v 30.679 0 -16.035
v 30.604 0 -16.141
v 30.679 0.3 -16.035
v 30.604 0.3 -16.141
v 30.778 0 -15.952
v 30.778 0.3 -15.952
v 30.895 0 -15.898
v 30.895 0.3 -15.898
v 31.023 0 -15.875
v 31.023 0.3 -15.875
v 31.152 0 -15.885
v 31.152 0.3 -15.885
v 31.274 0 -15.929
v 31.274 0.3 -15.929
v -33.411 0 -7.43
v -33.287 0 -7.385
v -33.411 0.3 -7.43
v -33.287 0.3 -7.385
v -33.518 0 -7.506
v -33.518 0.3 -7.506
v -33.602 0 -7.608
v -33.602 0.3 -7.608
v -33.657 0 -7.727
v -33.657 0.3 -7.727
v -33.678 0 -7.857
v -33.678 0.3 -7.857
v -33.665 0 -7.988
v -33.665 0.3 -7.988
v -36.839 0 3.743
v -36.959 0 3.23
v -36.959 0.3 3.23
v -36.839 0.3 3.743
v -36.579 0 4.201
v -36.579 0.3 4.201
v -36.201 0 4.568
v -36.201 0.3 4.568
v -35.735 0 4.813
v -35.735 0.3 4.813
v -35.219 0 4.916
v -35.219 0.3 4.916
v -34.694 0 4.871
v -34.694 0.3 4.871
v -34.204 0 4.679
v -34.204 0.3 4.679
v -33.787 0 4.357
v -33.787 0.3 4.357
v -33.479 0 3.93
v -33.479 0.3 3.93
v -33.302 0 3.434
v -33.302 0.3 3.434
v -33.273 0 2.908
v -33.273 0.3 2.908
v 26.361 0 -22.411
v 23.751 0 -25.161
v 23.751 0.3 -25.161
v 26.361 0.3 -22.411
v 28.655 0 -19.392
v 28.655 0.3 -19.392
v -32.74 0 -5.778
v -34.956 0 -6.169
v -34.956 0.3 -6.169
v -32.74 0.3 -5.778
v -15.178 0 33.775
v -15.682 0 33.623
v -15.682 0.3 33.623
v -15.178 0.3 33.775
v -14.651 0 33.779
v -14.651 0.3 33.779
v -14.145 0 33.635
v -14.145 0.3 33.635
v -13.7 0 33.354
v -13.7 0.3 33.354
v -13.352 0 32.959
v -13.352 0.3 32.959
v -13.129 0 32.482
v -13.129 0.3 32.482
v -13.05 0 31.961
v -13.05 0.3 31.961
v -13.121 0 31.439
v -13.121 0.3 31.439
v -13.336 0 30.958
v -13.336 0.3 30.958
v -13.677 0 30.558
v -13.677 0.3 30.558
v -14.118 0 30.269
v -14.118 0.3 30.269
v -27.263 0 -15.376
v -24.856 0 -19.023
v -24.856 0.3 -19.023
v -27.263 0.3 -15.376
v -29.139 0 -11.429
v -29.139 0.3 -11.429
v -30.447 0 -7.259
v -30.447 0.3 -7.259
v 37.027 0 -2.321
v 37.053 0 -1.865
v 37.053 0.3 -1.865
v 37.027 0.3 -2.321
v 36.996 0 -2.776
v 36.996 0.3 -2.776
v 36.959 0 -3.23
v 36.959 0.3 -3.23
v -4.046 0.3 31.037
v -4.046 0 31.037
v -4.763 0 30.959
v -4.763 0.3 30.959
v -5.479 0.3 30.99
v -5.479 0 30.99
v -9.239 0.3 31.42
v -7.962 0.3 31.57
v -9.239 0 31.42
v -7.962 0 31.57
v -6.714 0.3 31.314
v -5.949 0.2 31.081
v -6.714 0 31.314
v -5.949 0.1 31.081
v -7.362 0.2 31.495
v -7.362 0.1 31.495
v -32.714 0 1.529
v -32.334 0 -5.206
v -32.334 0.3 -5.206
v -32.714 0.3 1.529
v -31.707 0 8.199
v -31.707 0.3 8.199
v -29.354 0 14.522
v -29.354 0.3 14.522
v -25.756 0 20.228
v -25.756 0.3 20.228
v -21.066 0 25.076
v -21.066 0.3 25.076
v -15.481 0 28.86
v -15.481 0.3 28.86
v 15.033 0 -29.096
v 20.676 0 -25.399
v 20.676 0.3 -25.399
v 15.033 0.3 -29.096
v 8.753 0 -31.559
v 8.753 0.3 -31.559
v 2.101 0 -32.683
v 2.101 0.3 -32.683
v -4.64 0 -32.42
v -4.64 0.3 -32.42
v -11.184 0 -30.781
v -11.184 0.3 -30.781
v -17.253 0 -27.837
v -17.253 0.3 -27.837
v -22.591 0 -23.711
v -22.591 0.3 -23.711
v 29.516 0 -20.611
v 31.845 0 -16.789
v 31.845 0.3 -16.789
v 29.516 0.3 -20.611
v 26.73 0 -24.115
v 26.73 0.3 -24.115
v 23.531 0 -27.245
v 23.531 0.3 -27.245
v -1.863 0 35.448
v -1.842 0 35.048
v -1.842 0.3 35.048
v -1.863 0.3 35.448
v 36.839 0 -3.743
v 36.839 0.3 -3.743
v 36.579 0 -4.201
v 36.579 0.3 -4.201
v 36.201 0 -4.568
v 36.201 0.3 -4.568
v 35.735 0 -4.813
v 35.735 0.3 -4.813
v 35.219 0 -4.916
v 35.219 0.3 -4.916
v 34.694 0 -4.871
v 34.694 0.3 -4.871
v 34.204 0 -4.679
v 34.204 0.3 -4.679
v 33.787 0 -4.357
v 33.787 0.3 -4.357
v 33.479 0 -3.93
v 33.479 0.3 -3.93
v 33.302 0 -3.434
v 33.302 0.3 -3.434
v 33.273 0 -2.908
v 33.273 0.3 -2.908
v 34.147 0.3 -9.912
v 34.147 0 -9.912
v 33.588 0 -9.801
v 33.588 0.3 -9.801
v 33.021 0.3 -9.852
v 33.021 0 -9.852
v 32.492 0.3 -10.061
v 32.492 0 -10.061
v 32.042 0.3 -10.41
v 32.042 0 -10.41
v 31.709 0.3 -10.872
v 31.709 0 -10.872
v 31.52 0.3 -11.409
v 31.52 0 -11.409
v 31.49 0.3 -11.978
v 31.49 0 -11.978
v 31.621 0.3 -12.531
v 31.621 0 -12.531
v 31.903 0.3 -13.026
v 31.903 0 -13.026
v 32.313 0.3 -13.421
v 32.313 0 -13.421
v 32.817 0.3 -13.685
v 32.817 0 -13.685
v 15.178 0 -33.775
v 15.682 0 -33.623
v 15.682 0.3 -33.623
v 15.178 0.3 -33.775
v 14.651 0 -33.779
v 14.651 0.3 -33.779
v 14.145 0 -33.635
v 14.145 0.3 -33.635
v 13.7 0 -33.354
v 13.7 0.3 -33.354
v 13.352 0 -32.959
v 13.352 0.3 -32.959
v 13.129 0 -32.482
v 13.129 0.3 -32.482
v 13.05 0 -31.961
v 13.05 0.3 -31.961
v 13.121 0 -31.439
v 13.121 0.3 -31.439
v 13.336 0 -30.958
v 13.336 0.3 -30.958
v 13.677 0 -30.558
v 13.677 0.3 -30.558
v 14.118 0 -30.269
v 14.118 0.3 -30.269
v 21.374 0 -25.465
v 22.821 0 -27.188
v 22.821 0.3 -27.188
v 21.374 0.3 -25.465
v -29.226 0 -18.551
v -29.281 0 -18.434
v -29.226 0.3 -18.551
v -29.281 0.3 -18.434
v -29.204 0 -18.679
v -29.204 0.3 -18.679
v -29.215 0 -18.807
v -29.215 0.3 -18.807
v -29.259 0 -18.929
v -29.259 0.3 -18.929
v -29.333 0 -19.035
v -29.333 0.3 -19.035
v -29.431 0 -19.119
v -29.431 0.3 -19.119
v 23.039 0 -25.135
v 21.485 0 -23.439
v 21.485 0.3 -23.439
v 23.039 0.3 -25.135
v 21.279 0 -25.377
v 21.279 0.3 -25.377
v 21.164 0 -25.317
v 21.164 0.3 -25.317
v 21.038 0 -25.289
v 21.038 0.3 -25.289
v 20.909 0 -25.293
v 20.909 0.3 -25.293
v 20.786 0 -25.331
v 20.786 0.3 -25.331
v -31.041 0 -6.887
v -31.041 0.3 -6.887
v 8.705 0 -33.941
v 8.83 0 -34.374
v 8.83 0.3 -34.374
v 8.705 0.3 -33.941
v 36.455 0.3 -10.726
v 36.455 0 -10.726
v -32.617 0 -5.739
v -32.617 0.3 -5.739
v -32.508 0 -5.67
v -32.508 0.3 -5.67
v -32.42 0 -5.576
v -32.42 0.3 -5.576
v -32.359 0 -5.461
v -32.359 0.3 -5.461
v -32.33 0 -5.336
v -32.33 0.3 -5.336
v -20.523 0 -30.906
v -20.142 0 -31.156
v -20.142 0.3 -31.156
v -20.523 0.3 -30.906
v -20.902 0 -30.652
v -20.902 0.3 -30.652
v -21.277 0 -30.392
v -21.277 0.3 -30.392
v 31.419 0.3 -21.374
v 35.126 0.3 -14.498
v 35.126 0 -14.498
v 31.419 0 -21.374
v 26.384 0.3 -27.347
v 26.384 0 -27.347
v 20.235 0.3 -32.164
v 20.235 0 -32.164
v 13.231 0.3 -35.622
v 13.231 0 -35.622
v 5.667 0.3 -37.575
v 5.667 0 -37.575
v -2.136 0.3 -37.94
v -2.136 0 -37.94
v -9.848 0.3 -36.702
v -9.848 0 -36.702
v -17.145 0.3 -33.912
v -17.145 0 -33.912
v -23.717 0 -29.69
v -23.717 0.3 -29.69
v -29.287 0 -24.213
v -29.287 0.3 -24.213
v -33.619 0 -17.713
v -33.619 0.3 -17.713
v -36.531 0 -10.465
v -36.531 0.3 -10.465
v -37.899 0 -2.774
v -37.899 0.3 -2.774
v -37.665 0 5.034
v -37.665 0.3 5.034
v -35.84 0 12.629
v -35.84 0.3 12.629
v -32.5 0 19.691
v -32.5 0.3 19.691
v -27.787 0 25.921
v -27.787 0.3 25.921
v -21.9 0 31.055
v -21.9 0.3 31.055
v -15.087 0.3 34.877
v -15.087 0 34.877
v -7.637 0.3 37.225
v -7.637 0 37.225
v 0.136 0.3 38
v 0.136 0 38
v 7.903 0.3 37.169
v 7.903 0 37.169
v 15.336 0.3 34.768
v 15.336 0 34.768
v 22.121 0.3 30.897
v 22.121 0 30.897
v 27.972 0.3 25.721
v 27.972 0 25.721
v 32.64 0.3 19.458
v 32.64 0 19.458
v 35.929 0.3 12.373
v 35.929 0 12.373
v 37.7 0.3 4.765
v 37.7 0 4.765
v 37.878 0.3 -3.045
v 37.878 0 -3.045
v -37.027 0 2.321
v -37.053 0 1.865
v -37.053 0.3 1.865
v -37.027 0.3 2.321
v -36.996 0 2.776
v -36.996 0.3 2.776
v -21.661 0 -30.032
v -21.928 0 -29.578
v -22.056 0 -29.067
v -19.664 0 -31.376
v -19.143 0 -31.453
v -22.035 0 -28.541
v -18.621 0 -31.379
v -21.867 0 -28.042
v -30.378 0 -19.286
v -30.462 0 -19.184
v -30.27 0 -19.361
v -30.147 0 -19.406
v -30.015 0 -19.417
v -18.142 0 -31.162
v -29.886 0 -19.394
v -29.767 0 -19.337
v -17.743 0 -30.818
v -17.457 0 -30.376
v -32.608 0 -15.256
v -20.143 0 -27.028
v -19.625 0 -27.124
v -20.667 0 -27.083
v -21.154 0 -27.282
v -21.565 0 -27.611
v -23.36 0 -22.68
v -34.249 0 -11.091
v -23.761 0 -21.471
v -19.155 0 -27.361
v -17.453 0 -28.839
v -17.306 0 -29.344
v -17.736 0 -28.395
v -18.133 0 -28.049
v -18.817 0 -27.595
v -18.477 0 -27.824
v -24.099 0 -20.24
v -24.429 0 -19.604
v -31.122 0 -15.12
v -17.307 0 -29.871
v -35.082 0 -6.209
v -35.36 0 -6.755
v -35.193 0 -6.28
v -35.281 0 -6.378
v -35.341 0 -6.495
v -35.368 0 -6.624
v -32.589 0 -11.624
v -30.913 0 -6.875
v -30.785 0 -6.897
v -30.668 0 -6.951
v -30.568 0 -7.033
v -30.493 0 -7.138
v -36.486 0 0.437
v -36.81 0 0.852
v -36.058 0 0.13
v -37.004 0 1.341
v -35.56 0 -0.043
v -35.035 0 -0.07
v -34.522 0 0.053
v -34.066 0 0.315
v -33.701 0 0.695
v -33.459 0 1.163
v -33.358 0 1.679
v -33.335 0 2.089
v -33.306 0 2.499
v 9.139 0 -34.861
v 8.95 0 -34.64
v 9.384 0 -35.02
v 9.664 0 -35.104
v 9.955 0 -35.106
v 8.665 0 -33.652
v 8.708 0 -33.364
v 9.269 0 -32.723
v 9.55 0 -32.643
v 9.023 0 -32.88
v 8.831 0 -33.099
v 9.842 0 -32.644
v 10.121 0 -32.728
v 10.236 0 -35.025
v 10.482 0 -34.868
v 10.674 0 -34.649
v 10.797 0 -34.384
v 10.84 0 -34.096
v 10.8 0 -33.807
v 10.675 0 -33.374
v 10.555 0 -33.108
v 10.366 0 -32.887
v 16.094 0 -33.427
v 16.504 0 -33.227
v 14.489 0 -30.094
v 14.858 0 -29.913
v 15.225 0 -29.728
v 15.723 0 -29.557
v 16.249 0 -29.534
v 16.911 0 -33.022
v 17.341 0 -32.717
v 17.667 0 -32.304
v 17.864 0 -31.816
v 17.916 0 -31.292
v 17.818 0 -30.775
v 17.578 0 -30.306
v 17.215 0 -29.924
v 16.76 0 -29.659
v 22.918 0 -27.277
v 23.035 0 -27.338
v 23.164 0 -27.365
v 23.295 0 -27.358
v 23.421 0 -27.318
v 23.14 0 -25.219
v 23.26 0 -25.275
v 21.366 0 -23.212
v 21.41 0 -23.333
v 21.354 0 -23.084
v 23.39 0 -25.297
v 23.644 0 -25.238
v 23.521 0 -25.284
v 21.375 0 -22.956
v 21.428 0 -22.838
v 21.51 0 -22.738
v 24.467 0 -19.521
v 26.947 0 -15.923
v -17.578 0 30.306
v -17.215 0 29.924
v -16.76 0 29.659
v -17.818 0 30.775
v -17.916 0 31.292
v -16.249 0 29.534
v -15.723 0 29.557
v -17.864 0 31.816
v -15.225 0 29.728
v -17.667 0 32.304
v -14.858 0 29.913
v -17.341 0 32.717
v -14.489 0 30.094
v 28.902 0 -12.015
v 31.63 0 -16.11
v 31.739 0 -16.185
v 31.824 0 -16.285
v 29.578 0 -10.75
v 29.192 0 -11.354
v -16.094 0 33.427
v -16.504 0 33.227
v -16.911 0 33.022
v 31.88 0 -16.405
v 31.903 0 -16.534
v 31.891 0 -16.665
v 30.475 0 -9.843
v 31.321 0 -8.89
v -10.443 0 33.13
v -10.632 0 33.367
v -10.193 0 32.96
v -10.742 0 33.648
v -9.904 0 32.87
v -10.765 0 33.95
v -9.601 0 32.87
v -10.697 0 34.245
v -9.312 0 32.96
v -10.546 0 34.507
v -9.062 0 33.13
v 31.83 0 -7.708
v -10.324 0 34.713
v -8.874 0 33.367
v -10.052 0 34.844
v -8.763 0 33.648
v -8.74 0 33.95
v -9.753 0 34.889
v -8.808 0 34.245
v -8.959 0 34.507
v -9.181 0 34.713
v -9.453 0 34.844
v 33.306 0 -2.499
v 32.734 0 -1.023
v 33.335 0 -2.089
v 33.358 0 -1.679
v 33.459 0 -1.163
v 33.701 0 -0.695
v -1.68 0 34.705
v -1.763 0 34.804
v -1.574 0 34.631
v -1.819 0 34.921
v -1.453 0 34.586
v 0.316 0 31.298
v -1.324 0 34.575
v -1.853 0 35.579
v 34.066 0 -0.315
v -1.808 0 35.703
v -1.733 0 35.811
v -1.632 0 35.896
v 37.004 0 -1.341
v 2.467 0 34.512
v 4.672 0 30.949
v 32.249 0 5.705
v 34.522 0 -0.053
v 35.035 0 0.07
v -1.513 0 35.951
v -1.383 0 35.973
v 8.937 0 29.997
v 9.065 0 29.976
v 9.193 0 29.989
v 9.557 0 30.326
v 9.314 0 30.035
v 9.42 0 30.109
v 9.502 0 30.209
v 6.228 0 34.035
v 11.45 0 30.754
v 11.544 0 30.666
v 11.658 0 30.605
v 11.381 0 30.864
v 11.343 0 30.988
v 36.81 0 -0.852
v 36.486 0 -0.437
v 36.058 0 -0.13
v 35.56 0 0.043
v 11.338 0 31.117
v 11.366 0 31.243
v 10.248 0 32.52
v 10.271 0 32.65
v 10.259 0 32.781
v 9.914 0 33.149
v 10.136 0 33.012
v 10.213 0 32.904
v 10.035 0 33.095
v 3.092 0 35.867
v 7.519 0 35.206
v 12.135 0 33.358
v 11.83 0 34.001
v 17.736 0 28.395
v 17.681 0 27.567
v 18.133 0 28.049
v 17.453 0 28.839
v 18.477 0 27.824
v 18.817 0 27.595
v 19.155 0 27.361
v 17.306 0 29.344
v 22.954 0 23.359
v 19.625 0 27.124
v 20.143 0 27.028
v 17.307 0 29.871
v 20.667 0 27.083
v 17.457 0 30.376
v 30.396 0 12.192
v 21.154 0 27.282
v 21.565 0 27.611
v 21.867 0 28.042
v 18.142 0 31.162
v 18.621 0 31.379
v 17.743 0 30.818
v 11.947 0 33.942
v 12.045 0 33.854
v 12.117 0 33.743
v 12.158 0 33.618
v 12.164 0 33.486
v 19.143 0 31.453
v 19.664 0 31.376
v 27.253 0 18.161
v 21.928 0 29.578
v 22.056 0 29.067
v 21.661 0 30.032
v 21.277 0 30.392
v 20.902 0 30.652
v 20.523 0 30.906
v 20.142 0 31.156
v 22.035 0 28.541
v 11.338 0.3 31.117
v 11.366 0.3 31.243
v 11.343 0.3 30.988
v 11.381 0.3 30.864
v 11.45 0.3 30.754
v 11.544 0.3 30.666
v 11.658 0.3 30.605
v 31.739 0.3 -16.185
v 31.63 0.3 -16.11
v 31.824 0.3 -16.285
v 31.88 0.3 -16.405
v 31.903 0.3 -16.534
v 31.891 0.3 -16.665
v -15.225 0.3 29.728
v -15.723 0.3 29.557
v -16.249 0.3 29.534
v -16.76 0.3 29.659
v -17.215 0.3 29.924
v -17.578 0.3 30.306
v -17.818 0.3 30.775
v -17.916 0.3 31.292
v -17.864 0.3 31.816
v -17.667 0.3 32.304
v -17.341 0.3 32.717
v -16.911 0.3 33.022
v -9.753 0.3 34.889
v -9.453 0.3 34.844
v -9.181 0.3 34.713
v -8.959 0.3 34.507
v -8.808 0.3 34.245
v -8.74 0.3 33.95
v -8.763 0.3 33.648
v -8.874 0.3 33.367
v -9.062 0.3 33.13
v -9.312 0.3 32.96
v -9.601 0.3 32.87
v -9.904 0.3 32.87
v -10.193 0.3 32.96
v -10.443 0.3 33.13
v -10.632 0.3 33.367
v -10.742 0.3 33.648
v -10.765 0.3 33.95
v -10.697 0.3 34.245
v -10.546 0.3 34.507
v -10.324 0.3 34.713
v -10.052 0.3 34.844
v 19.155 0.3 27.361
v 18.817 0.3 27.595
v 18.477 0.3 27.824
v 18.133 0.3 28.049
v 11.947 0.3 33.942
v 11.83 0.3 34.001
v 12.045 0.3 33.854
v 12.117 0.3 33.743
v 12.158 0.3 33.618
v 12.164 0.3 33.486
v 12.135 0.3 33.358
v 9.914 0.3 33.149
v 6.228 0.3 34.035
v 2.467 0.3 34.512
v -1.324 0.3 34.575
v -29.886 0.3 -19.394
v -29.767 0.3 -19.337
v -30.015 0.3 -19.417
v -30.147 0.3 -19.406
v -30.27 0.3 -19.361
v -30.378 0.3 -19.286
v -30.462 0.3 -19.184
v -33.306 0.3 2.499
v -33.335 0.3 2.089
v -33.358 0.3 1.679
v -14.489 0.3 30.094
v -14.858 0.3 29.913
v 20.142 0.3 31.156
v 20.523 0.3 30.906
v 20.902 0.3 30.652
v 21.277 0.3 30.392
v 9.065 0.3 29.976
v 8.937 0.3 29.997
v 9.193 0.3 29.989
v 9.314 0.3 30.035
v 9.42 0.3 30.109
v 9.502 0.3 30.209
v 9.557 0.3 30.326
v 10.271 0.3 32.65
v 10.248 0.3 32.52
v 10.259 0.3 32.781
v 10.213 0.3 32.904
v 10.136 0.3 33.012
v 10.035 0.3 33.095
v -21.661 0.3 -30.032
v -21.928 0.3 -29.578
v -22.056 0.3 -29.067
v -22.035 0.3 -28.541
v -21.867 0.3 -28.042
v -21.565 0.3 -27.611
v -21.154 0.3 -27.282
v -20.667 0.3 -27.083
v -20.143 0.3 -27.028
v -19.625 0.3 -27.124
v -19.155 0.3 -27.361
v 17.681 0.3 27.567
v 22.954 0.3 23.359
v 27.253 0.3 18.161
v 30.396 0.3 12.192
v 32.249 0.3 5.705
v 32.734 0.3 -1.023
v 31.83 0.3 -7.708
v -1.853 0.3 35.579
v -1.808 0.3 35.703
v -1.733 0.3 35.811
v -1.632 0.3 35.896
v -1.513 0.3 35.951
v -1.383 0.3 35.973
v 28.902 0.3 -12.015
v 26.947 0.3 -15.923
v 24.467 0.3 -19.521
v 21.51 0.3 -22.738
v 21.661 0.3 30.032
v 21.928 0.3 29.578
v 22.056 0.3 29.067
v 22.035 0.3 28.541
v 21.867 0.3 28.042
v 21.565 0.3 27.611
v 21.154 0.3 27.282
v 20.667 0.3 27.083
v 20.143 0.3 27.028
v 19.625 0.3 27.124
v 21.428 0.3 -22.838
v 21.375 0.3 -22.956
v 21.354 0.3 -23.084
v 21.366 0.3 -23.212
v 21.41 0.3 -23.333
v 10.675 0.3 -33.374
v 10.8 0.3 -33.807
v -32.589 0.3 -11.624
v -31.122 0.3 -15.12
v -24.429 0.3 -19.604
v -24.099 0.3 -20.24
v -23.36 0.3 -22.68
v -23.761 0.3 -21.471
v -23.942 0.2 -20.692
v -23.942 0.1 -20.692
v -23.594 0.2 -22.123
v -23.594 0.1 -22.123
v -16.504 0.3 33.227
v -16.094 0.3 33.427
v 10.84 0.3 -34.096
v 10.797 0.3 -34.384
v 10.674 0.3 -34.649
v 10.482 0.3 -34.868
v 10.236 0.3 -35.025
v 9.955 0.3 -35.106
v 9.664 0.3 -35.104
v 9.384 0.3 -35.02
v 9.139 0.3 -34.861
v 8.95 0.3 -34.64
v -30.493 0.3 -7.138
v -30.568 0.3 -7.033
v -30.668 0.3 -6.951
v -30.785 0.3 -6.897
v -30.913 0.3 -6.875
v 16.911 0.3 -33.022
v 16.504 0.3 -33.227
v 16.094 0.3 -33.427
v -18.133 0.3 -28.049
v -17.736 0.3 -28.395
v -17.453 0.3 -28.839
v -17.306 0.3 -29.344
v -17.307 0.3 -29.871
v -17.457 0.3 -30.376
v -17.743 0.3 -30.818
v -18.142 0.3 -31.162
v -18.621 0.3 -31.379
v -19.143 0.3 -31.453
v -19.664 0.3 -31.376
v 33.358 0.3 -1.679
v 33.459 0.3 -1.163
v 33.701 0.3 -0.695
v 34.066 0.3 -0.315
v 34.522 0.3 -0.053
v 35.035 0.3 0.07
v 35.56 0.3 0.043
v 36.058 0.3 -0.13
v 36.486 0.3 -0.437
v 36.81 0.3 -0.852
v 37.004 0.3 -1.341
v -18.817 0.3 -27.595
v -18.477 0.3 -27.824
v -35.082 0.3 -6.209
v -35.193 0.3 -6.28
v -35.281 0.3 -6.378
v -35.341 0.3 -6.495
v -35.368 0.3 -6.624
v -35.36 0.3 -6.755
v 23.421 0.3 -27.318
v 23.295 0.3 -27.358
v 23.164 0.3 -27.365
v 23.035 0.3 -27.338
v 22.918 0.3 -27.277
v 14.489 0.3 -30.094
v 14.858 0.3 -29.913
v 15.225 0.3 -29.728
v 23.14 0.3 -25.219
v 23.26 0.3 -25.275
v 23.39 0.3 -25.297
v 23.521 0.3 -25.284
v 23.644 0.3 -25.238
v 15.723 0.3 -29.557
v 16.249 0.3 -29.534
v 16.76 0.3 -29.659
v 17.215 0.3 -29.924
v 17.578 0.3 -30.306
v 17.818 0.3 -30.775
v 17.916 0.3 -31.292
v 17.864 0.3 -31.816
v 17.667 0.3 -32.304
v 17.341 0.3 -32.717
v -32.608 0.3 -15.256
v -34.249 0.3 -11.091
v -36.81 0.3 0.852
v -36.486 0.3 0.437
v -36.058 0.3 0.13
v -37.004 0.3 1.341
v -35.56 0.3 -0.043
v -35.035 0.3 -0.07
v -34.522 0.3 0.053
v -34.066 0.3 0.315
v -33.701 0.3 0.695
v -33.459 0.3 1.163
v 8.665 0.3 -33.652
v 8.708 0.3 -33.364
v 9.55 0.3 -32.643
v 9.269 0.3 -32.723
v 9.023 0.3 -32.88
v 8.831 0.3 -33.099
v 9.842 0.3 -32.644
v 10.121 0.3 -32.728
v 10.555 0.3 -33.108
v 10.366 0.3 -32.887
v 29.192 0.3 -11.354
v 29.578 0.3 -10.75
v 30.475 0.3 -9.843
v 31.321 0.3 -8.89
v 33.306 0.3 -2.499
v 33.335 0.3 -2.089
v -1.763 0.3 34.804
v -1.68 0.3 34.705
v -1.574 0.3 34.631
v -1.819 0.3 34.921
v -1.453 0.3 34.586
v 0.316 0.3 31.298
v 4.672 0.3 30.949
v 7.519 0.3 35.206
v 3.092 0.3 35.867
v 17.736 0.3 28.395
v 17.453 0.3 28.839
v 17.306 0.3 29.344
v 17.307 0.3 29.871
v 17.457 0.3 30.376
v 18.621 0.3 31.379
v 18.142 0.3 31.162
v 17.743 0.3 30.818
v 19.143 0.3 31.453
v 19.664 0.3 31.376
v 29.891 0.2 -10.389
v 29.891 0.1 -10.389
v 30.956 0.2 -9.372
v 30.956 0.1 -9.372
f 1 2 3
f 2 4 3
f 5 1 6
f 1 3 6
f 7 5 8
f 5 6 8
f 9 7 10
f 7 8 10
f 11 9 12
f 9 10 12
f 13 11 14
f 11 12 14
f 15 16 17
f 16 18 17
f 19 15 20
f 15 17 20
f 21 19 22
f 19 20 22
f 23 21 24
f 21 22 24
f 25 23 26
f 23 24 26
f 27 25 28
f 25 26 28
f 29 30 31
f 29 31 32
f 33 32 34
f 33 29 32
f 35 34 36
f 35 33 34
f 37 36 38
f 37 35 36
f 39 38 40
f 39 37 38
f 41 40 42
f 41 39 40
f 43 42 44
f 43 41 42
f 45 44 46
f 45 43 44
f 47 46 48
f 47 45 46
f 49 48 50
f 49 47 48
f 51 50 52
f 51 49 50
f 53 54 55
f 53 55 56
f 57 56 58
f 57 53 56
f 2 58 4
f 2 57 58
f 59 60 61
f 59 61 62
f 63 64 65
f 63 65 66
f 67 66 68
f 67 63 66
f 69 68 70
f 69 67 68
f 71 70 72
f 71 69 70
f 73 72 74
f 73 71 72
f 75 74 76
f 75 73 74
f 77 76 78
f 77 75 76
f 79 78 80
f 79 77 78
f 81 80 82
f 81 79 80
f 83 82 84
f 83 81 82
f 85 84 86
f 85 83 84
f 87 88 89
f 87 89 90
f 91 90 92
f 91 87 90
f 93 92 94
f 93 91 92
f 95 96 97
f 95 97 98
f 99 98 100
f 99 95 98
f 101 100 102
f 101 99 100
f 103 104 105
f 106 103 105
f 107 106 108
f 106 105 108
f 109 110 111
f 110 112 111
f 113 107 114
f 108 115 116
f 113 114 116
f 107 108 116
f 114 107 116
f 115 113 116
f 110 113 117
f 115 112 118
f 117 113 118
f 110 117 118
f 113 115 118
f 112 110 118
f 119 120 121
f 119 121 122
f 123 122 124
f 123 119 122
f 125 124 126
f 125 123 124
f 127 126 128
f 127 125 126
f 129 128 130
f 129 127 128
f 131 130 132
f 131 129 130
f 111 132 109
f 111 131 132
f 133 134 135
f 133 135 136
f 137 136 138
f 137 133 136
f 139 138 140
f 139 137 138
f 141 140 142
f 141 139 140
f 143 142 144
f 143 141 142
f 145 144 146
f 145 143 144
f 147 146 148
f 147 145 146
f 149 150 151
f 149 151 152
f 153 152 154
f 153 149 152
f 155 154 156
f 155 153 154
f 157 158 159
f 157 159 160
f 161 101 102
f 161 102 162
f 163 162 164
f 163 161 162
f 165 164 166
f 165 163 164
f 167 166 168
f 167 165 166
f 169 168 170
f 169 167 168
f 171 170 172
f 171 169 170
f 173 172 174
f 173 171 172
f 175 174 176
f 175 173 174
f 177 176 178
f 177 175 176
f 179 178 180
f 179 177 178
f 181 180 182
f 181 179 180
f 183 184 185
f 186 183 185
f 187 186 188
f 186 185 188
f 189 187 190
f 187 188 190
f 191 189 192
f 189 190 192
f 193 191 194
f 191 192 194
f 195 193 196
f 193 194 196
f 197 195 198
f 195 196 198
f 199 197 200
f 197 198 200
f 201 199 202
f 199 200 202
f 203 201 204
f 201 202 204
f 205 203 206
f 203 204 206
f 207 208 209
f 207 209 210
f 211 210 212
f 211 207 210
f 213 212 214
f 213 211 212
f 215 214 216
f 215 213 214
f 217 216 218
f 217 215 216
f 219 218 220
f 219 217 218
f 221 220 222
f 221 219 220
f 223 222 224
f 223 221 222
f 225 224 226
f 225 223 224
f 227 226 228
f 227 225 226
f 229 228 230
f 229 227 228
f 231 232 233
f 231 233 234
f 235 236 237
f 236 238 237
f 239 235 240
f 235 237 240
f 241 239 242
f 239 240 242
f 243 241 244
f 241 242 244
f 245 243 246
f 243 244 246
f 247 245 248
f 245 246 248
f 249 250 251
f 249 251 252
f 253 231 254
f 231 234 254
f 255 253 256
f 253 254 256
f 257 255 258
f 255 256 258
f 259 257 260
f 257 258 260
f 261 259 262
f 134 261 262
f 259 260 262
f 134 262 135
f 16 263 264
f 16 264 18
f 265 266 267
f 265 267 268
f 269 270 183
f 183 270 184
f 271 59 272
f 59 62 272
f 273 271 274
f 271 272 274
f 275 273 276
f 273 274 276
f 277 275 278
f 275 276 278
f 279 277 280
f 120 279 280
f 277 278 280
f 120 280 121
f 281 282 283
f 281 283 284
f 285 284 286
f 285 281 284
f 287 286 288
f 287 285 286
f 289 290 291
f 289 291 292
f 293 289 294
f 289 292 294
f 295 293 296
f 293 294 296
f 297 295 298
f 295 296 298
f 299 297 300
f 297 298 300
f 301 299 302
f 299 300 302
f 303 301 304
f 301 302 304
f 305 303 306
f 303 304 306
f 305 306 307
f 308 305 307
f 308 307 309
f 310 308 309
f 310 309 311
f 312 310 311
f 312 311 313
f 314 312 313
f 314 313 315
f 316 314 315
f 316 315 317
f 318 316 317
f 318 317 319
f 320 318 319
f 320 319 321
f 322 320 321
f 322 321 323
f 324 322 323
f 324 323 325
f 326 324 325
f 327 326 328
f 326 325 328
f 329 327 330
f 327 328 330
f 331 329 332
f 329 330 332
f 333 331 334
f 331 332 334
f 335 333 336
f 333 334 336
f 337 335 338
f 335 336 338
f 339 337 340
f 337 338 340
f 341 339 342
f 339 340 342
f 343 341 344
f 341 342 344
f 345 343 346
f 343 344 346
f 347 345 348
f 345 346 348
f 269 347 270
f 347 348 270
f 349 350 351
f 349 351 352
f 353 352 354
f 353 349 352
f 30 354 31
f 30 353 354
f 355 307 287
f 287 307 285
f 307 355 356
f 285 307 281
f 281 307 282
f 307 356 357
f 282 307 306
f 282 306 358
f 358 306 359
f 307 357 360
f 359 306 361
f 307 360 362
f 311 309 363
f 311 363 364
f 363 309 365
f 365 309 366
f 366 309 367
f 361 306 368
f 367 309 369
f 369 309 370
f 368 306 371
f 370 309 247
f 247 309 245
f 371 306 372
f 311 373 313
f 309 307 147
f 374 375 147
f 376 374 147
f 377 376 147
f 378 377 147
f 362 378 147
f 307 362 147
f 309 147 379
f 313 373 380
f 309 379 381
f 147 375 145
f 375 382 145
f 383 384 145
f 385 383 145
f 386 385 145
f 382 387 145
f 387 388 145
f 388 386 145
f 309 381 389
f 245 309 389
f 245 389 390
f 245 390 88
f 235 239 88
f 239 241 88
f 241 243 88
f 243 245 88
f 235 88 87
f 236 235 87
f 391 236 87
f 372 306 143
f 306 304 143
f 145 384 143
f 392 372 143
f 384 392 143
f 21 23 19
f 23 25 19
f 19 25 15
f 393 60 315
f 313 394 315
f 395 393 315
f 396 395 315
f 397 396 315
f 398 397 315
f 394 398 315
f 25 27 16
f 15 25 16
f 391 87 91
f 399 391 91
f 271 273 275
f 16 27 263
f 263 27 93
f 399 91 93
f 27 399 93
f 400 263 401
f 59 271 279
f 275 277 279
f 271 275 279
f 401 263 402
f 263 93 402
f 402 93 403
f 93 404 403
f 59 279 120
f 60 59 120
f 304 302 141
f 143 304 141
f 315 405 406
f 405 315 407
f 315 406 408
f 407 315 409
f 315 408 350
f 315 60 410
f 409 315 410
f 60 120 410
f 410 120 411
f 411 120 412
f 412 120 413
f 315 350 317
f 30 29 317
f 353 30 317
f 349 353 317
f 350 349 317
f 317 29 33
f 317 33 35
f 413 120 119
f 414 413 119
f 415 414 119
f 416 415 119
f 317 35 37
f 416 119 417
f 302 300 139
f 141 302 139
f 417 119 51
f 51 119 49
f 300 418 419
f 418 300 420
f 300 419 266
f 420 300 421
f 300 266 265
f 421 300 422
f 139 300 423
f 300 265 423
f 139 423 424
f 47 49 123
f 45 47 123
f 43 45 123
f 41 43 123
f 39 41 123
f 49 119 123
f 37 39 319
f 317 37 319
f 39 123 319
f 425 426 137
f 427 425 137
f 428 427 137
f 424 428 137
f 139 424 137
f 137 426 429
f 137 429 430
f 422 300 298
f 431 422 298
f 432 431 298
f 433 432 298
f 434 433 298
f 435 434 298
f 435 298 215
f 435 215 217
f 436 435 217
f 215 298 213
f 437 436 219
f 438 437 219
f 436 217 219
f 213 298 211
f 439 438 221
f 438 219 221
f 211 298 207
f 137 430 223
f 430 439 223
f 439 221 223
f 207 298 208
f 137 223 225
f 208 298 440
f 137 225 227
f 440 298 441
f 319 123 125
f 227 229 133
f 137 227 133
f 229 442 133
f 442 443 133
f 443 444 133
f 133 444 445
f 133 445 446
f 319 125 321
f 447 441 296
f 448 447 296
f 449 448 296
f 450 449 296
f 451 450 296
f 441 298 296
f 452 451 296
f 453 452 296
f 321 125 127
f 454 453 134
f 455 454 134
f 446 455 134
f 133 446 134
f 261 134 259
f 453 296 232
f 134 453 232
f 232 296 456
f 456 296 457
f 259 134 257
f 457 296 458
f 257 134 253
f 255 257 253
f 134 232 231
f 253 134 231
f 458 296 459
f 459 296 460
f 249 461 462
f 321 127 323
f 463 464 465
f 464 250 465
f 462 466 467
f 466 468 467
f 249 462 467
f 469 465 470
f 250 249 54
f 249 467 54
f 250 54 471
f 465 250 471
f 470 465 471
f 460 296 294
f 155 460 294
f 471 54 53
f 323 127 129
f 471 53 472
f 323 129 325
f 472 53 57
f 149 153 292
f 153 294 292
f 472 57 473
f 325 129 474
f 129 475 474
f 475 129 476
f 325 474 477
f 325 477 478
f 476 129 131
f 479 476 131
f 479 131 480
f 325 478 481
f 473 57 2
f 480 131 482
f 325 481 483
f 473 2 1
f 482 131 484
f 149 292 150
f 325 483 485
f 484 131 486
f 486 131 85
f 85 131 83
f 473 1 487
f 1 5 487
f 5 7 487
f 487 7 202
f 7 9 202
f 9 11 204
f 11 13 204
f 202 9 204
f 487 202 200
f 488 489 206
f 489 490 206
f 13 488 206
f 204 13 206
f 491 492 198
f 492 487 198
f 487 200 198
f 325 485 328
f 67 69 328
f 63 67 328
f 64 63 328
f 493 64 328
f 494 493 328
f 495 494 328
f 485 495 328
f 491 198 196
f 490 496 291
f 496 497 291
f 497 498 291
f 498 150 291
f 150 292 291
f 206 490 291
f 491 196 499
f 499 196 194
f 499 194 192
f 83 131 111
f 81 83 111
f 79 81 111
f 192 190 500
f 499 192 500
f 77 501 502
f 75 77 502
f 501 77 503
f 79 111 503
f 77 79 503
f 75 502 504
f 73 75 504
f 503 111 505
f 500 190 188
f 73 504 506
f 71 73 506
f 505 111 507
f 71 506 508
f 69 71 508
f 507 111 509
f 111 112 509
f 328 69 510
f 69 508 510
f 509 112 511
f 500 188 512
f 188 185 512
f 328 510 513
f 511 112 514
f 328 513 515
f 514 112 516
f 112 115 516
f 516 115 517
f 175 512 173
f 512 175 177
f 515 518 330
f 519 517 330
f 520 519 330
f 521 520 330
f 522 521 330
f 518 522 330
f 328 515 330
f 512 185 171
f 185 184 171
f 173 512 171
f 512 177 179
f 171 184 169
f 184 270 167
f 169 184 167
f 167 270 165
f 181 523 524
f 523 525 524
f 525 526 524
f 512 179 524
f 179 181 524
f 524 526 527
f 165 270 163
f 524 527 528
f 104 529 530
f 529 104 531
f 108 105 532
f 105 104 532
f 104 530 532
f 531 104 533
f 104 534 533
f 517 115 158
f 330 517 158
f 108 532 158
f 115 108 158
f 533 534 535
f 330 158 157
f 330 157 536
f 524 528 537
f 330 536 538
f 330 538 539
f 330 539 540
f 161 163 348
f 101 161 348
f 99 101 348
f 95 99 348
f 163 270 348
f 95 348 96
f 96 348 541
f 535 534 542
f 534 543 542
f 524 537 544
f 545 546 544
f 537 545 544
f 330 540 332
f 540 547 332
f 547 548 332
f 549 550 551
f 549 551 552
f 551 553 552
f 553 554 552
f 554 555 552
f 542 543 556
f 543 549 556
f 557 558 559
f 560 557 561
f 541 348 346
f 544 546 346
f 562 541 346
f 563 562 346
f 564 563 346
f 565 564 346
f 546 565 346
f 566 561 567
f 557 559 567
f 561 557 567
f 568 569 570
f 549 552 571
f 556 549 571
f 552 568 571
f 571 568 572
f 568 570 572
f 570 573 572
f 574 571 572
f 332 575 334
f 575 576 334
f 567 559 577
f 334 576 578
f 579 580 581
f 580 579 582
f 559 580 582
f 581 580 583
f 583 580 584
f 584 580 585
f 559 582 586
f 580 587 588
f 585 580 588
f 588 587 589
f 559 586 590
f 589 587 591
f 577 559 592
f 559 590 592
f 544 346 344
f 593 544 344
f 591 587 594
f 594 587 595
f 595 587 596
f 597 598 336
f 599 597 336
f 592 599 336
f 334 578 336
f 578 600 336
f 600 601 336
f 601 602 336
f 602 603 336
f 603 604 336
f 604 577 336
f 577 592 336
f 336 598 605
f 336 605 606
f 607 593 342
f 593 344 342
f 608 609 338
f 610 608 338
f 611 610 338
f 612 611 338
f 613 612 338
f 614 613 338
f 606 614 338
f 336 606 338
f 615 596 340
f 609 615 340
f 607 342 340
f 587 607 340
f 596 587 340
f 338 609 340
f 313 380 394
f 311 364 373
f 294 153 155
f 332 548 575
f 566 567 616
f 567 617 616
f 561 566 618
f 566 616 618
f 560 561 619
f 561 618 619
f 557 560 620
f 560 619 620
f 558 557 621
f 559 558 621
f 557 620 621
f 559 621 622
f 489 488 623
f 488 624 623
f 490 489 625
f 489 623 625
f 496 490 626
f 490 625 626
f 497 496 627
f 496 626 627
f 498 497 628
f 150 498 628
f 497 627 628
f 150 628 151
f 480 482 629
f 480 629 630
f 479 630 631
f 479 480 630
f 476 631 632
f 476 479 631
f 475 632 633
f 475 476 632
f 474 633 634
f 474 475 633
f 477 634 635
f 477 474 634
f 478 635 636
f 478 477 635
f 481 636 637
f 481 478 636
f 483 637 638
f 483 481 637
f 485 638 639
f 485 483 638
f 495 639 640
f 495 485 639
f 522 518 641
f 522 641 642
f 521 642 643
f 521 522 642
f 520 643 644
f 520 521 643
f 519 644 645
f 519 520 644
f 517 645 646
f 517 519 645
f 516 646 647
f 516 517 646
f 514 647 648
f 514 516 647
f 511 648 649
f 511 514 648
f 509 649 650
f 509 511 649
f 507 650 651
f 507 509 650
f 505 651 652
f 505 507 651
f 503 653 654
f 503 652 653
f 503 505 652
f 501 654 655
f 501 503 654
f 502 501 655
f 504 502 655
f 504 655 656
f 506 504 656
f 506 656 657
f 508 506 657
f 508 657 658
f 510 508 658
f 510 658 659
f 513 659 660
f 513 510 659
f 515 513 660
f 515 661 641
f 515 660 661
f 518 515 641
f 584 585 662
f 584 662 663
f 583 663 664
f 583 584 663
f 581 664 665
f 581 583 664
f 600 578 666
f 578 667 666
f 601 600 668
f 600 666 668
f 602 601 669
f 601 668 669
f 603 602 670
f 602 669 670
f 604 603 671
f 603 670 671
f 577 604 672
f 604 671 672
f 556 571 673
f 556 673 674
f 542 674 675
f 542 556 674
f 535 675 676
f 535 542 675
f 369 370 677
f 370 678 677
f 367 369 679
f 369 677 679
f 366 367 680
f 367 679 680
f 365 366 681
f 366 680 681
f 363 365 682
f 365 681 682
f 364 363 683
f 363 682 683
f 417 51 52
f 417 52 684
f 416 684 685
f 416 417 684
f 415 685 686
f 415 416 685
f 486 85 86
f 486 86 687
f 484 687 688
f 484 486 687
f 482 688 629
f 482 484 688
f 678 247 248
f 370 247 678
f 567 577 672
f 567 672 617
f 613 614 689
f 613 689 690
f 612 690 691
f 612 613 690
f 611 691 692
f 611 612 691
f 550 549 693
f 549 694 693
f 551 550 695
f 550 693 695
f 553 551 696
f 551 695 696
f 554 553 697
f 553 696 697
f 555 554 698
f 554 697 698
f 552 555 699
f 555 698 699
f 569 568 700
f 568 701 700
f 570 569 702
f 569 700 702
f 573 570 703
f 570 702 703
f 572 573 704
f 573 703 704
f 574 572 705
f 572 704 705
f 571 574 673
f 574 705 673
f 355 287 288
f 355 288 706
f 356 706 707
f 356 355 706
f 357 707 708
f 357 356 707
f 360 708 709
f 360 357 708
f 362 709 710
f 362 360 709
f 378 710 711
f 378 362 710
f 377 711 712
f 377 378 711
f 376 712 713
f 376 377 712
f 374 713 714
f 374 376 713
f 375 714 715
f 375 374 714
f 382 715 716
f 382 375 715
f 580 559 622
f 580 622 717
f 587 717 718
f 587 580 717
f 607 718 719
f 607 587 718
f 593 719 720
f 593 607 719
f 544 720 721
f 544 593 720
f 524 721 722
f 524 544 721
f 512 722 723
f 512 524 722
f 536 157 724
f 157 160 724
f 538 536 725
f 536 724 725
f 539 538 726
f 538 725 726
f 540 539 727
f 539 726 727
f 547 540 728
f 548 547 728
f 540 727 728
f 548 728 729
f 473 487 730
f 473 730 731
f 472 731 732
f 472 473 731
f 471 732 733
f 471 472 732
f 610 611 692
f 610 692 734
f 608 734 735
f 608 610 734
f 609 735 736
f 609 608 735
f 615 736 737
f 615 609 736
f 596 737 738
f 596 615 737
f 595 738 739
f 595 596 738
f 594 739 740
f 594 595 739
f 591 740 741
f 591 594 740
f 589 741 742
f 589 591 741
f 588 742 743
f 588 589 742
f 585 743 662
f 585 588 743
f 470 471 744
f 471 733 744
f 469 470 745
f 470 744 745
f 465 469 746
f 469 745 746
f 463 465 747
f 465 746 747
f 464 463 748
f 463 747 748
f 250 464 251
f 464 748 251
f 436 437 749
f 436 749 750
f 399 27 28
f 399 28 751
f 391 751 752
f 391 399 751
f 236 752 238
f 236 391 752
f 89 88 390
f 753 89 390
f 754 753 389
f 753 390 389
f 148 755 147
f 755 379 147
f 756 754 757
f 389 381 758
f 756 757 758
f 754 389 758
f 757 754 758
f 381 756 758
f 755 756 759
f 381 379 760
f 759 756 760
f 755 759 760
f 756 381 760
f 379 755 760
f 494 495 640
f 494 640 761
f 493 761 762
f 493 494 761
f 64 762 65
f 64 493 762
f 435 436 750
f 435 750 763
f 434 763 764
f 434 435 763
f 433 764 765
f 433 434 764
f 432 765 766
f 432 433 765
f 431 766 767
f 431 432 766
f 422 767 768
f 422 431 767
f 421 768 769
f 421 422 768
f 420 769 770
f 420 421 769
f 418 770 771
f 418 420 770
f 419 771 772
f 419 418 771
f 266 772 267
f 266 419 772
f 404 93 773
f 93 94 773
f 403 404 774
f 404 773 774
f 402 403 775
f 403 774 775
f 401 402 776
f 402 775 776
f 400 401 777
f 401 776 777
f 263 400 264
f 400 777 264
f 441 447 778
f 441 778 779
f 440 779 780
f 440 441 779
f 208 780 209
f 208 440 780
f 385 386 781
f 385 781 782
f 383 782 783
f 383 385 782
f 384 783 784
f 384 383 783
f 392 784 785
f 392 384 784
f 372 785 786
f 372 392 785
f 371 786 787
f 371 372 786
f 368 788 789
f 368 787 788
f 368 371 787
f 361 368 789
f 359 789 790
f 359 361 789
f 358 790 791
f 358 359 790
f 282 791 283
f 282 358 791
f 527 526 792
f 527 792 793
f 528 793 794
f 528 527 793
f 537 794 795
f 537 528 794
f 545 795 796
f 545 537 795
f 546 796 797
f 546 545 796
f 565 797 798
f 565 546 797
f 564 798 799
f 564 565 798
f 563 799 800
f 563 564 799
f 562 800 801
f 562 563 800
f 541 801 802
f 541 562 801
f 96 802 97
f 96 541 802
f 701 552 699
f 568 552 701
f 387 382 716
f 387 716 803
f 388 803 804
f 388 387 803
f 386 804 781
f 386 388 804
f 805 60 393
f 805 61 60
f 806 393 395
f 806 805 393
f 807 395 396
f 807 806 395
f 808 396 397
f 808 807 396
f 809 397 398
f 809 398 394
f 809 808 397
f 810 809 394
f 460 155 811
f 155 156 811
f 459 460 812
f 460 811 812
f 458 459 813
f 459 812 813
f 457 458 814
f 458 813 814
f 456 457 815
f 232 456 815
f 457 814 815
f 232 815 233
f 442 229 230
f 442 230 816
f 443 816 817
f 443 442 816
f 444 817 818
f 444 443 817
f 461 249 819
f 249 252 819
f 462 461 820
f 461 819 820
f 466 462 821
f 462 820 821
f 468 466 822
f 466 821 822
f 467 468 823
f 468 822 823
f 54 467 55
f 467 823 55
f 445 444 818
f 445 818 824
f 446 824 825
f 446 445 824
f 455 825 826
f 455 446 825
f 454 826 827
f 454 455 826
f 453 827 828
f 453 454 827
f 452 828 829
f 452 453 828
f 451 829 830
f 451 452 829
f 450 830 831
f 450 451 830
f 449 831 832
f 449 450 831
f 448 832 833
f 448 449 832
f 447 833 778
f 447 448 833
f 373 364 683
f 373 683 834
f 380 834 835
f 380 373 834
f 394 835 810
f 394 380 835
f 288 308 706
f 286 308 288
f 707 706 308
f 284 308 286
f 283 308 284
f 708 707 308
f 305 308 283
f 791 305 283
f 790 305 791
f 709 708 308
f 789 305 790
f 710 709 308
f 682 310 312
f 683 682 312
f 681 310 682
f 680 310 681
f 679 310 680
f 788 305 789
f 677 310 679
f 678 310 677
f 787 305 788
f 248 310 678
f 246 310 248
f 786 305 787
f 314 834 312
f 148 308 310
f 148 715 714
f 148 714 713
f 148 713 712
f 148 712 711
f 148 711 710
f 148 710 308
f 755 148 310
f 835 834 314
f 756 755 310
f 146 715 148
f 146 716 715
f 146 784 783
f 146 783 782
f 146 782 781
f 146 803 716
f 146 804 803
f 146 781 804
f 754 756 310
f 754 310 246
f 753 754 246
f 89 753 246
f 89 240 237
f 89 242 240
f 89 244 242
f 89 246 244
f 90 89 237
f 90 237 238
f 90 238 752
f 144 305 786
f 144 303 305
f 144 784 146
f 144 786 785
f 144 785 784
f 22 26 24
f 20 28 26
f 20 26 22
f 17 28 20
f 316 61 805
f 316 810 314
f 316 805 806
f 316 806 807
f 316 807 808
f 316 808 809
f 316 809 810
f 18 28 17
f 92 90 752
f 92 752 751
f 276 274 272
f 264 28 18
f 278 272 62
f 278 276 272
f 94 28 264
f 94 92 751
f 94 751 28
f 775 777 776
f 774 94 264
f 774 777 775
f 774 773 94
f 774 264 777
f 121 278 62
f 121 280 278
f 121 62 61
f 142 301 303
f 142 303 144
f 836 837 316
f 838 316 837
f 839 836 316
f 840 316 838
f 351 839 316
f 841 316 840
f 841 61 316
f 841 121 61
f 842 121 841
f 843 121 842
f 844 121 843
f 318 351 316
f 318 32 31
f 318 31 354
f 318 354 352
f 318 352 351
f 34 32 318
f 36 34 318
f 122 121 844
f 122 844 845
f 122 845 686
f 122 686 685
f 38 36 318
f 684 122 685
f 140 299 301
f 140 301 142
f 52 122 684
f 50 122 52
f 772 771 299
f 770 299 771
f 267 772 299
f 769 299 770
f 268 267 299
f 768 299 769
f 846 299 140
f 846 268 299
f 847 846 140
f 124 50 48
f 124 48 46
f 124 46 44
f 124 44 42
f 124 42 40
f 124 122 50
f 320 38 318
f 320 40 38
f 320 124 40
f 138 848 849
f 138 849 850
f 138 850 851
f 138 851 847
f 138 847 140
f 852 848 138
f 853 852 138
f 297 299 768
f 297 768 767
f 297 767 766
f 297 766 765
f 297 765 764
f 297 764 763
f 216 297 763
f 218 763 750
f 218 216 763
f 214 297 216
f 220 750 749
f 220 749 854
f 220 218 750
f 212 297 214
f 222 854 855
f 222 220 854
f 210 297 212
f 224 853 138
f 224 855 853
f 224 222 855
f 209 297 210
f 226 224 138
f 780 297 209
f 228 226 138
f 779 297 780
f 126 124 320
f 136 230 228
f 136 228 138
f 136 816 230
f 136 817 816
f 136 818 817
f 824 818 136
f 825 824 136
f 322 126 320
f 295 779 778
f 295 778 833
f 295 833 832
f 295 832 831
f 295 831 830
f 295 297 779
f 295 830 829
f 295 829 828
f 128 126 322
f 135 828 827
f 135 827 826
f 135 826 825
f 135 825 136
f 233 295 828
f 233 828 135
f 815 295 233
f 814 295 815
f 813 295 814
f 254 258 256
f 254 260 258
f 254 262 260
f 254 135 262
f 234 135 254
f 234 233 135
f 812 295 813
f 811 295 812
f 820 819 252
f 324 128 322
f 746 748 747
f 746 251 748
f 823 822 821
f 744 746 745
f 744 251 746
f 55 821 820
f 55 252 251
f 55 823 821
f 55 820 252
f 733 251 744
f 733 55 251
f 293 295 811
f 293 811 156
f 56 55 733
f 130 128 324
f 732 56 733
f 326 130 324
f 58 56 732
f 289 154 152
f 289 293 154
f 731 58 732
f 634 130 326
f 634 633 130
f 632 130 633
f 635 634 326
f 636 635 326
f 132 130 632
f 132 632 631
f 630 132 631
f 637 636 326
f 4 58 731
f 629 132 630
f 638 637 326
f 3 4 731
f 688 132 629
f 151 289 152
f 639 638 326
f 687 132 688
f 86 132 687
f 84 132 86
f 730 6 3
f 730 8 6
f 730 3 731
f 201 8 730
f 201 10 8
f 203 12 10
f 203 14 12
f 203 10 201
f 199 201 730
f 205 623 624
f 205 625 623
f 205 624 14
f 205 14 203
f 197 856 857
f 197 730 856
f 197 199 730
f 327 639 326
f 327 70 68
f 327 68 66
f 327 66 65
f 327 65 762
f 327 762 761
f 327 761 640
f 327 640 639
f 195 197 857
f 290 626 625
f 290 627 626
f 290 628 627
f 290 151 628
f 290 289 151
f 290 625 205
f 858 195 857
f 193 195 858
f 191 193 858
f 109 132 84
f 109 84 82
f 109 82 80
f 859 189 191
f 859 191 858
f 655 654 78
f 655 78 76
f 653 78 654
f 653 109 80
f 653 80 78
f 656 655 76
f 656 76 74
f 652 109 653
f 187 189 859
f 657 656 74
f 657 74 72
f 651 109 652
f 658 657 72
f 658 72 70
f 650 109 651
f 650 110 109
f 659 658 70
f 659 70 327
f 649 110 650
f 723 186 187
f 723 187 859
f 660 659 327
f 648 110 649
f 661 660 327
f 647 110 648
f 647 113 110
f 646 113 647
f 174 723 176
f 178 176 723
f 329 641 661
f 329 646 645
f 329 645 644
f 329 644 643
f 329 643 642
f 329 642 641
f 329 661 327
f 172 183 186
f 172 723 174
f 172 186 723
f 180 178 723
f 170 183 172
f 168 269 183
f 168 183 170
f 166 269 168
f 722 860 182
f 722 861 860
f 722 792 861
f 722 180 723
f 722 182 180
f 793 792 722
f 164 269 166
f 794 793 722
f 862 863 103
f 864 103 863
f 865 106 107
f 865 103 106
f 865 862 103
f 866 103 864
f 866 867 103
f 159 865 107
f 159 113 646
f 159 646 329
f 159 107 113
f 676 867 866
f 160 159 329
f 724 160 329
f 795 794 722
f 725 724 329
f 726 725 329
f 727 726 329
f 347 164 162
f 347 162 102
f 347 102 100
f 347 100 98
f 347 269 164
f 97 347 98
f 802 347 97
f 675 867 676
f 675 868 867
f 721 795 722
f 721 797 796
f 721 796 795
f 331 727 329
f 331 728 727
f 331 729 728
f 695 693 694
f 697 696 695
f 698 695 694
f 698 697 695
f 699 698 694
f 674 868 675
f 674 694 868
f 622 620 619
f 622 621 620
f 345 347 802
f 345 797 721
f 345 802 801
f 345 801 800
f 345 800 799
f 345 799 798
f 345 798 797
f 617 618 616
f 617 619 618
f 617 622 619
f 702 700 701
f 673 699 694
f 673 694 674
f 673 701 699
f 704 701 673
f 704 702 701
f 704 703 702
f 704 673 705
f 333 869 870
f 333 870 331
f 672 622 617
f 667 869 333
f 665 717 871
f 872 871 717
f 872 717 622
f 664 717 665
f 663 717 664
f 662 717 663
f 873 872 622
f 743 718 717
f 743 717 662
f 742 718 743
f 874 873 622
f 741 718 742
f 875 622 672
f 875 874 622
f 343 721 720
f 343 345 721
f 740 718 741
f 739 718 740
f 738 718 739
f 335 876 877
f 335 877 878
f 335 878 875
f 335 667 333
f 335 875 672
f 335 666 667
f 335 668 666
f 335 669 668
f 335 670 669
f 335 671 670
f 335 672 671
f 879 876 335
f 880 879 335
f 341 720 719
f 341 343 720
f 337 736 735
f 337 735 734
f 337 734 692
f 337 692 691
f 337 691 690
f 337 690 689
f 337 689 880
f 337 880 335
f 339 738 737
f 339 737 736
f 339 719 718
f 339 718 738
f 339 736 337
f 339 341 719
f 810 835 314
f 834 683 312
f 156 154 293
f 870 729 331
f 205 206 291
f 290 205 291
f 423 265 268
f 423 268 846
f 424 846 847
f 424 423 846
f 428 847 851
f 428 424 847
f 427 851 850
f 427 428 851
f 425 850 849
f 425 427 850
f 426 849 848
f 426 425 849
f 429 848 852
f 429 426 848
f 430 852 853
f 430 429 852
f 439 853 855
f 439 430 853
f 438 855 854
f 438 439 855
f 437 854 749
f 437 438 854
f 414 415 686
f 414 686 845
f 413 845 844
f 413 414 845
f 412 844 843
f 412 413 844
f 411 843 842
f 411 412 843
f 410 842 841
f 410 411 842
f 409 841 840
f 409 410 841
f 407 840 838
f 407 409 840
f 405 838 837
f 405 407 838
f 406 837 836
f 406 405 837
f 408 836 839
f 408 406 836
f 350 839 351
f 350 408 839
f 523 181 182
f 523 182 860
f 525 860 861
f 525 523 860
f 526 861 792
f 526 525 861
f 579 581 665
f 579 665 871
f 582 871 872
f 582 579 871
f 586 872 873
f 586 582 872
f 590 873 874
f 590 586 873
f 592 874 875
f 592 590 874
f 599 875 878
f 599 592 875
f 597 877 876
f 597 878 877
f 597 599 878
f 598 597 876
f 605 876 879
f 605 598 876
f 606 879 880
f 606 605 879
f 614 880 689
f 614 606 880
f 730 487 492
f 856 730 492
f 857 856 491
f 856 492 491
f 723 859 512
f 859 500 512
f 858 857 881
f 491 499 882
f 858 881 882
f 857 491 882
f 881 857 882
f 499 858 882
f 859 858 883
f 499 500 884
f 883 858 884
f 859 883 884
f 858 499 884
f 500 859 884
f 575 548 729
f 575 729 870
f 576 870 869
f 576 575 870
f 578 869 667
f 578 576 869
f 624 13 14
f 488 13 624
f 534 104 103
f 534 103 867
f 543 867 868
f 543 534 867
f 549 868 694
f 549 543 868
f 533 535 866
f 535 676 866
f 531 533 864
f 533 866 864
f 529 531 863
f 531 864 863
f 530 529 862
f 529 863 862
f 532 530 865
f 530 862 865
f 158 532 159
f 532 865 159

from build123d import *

# Parameters (mm, degrees)
SKETCH1_R               = 38
BOSS_EXTRUDE1_DEPTH     = 0.3
CUT_EXTRUDE1_DEPTH      = 54.740952727
CUT_EXTRUDE1_DEPTH_BACK = 54.740952727
SKETCH2_R               = 1.015
FILLET2_R               = 0.5


with BuildPart() as part:
    # Sketch1 → Boss-Extrude1 (new body)
    with BuildSketch(Plane(origin=(0, 0, 0), x_dir=(1, 0, 0), z_dir=(0, 1, 0))):
        with Locations(Location((0, 0, 0), (0, 0, 270))):
            Circle(SKETCH1_R)
    extrude(amount=BOSS_EXTRUDE1_DEPTH)

    # Sketch2 → Cut-Extrude1 (cut, two sides: drawn at the far end of the back side and taken through both)
    with BuildSketch(Plane(origin=(0, 0.3, 0), x_dir=(1, 0, 0), z_dir=(0, 1, 0)).offset(-CUT_EXTRUDE1_DEPTH_BACK)):
        with BuildLine():
            ThreePointArc((-37.053075912, -1.865359337), (-37.012379228, -2.548290386), (-36.959096408, -3.230354883))
            ThreePointArc((-36.959096408, -3.230354883), (-34.955040212, -4.912246307), (-33.273148788, -2.908190111))
            ThreePointArc((-33.273148788, -2.908190111), (-33.321117688, -2.294148218), (-33.357755673, -1.679326196))
            ThreePointArc((-33.357755673, -1.679326196), (-35.298432363, 0.075317353), (-37.053075912, -1.865359337))
        make_face()
        with BuildLine():
            ThreePointArc((-16.911089383, -33.021584697), (-16.299305403, -33.327805859), (-15.681978812, -33.622693832))
            ThreePointArc((-15.681978812, -33.622693832), (-13.223390014, -32.728075967), (-14.118007879, -30.26948717))
            ThreePointArc((-14.118007879, -30.26948717), (-14.673768207, -30.004008509), (-15.22453869, -29.728326924))
            ThreePointArc((-15.22453869, -29.728326924), (-17.714442923, -30.531680464), (-16.911089383, -33.021584697))
        make_face()
        with Locations(Location((-9.752534436, -33.874039795, 0), (0, 0, 270))):
            Circle(SKETCH2_R)
        with BuildLine():
            ThreePointArc((20.141986529, -31.15622536), (20.713073824, -30.779515473), (21.277117596, -30.392338949))
            ThreePointArc((21.277117596, -30.392338949), (21.731650198, -27.81582966), (19.155140909, -27.361297059))
            ThreePointArc((19.155140909, -27.361297059), (18.647349481, -27.709860291), (18.133216983, -28.049000728))
            ThreePointArc((18.133216983, -28.049000728), (17.58398944, -30.606997817), (20.141986529, -31.15622536))
        make_face()
        with BuildLine():
            ThreePointArc((37.053075912, 1.865359337), (37.012379228, 2.548290386), (36.959096408, 3.230354883))
            ThreePointArc((36.959096408, 3.230354883), (34.955040212, 4.912246307), (33.273148788, 2.908190111))
            ThreePointArc((33.273148788, 2.908190111), (33.321117688, 2.294148218), (33.357755673, 1.679326196))
            ThreePointArc((33.357755673, 1.679326196), (35.298432363, -0.075317353), (37.053075912, 1.865359337))
        make_face()
        with BuildLine():
            ThreePointArc((16.911089383, 33.021584697), (16.299305403, 33.327805859), (15.681978812, 33.622693832))
            ThreePointArc((15.681978812, 33.622693832), (13.223390014, 32.728075967), (14.118007879, 30.26948717))
            ThreePointArc((14.118007879, 30.26948717), (14.673768207, 30.004008509), (15.22453869, 29.728326924))
            ThreePointArc((15.22453869, 29.728326924), (17.714442923, 30.531680464), (16.911089383, 33.021584697))
        make_face()
        with BuildLine():
            ThreePointArc((-20.141986529, 31.15622536), (-20.713073824, 30.779515473), (-21.277117596, 30.392338949))
            ThreePointArc((-21.277117596, 30.392338949), (-21.731650198, 27.81582966), (-19.155140909, 27.361297059))
            ThreePointArc((-19.155140909, 27.361297059), (-18.647349481, 27.709860291), (-18.133216983, 28.049000728))
            ThreePointArc((-18.133216983, 28.049000728), (-17.58398944, 30.606997817), (-20.141986529, 31.15622536))
        make_face()
        with BuildLine():
            Line((-29.015113588, 18.848957093), (-30.189135525, 19.611631658))
            ThreePointArc((-30.189135525, 19.611631658), (-33.493010206, 13.199176768), (-35.452120741, 6.256767133))
            Line((-35.452120741, 6.256767133), (-32.251582063, 5.6919201))
            ThreePointArc((-32.251582063, 5.6919201), (-27.833314361, -17.258885007), (-9.23942383, -31.41966816))
            add(Edge.make_bspline(
                [(-4.046231948, -31.037364692), (-6.510871152, -30.608176232), (-6.812515045, -32.026230627), (-9.23942383, -31.41966816)],
                knots=[0, 0, 0, 0, 1, 1, 1, 1], degree=3))
            ThreePointArc((-4.046231948, -31.037364692), (2.745296544, -31.179373741), (9.407517011, -29.852782512))
            Line((9.407517011, -29.852782512), (10.399363852, -33.000200476))
            ThreePointArc((10.399363852, -33.000200476), (4.361224586, -34.324039974), (-1.816118884, -34.552304007))
            Line((-1.816118884, -34.552304007), (-1.889603463, -35.950374111))
            ThreePointArc((-1.889603463, -35.950374111), (5.315682713, -35.605386071), (12.307541088, -33.830820746))
            Line((12.307541088, -33.830820746), (11.196443628, -30.776649429))
            ThreePointArc((11.196443628, -30.776649429), (28.863290038, -15.474914804), (31.82994272, 7.708258327))
            add(Edge.make_bspline(
                [(28.902262264, 12.014542689), (29.762893756, 9.665508298), (31.141786833, 10.113304221), (31.82994272, 7.708258327)],
                knots=[0, 0, 0, 0, 1, 1, 1, 1], degree=3))
            ThreePointArc((28.902262264, 12.014542689), (25.629481462, 17.967183419), (21.149509523, 23.073539974))
            Line((21.149509523, 23.073539974), (23.379330016, 25.506213517))
            ThreePointArc((23.379330016, 25.506213517), (27.544878285, 20.93895127), (30.831232471, 15.703346914))
            Line((30.831232471, 15.703346914), (32.078738987, 16.338742454))
            ThreePointArc((32.078738987, 16.338742454), (28.177327493, 22.406209304), (23.144579654, 27.574053613))
            Line((23.144579654, 27.574053613), (21.055138435, 25.084729329))
            ThreePointArc((21.055138435, 25.084729329), (-1.029975677, 32.733799812), (-22.59051889, 23.711409833))
            add(Edge.make_bspline(
                [(-24.856030316, 19.022822003), (-23.252022604, 20.942667934), (-24.329271788, 21.912926407), (-22.59051889, 23.711409833)],
                knots=[0, 0, 0, 0, 1, 1, 1, 1], degree=3))
            ThreePointArc((-24.856030316, 19.022822003), (-28.374778006, 13.212190322), (-30.557026534, 6.779242538))
            Line((-30.557026534, 6.779242538), (-33.778693868, 7.493986959))
            ThreePointArc((-33.778693868, 7.493986959), (-31.906102871, 13.385088704), (-29.015113588, 18.848957093))
        make_face()
        with BuildLine():
            Line((36.454916606, 10.725626099), (34.146703694, 9.912246307))
            ThreePointArc((34.146703694, 9.912246307), (31.595686664, 11.133848581), (32.817288938, 13.68486561))
            Line((32.817288938, 13.68486561), (35.12550185, 14.498245403))
            ThreePointArc((35.12550185, 14.498245403), (35.83988338, 12.629440181), (36.454916606, 10.725626099))
        make_face()
        with BuildLine():
            ThreePointArc((10.799774466, 33.806672736), (10.098368991, 35.07524688), (8.829794847, 34.373841405))
            Line((8.829794847, 34.373841405), (8.705294407, 33.941406855))
            ThreePointArc((8.705294407, 33.941406855), (9.406699882, 32.672832711), (10.675274026, 33.374238186))
            Line((10.675274026, 33.374238186), (10.799774466, 33.806672736))
        make_face()
    extrude(amount=CUT_EXTRUDE1_DEPTH + CUT_EXTRUDE1_DEPTH_BACK, mode=Mode.SUBTRACT)

    # Fillet2
    fillet2_edges = [part.edges().sort_by_distance(p)[0] for p in [
        (-9.23942383, 0.15, 31.41966816),
        (-35.452120741, 0.15, -6.256767133),
        (-30.189135525, 0.15, -19.611631658),
        (-29.015113588, 0.15, -18.848957093),
        (-33.778693868, 0.15, -7.493986959),
        (-30.557026534, 0.15, -6.779242538),
        (-24.856030316, 0.15, -19.022822003),
        (-22.59051889, 0.15, -23.711409833),
        (21.055138435, 0.15, -25.084729329),
        (23.144579654, 0.15, -27.574053613),
        (32.078738987, 0.15, -16.338742454),
        (30.831232471, 0.15, -15.703346914),
        (23.379330016, 0.15, -25.506213517),
        (21.149509523, 0.15, -23.073539974),
        (28.902262264, 0.15, -12.014542689),
        (31.82994272, 0.15, -7.708258327),
        (11.196443628, 0.15, 30.776649429),
        (12.307541088, 0.15, 33.830820746),
        (-1.889603463, 0.15, 35.950374111),
        (-1.816118884, 0.15, 34.552304007),
        (10.399363852, 0.15, 33.000200476),
        (9.407517011, 0.15, 29.852782512),
        (-4.046231948, 0.15, 31.037364692),
        (-32.251582063, 0.15, -5.6919201),
    ]]
    fillet(fillet2_edges, radius=FILLET2_R)


solid = part.part
